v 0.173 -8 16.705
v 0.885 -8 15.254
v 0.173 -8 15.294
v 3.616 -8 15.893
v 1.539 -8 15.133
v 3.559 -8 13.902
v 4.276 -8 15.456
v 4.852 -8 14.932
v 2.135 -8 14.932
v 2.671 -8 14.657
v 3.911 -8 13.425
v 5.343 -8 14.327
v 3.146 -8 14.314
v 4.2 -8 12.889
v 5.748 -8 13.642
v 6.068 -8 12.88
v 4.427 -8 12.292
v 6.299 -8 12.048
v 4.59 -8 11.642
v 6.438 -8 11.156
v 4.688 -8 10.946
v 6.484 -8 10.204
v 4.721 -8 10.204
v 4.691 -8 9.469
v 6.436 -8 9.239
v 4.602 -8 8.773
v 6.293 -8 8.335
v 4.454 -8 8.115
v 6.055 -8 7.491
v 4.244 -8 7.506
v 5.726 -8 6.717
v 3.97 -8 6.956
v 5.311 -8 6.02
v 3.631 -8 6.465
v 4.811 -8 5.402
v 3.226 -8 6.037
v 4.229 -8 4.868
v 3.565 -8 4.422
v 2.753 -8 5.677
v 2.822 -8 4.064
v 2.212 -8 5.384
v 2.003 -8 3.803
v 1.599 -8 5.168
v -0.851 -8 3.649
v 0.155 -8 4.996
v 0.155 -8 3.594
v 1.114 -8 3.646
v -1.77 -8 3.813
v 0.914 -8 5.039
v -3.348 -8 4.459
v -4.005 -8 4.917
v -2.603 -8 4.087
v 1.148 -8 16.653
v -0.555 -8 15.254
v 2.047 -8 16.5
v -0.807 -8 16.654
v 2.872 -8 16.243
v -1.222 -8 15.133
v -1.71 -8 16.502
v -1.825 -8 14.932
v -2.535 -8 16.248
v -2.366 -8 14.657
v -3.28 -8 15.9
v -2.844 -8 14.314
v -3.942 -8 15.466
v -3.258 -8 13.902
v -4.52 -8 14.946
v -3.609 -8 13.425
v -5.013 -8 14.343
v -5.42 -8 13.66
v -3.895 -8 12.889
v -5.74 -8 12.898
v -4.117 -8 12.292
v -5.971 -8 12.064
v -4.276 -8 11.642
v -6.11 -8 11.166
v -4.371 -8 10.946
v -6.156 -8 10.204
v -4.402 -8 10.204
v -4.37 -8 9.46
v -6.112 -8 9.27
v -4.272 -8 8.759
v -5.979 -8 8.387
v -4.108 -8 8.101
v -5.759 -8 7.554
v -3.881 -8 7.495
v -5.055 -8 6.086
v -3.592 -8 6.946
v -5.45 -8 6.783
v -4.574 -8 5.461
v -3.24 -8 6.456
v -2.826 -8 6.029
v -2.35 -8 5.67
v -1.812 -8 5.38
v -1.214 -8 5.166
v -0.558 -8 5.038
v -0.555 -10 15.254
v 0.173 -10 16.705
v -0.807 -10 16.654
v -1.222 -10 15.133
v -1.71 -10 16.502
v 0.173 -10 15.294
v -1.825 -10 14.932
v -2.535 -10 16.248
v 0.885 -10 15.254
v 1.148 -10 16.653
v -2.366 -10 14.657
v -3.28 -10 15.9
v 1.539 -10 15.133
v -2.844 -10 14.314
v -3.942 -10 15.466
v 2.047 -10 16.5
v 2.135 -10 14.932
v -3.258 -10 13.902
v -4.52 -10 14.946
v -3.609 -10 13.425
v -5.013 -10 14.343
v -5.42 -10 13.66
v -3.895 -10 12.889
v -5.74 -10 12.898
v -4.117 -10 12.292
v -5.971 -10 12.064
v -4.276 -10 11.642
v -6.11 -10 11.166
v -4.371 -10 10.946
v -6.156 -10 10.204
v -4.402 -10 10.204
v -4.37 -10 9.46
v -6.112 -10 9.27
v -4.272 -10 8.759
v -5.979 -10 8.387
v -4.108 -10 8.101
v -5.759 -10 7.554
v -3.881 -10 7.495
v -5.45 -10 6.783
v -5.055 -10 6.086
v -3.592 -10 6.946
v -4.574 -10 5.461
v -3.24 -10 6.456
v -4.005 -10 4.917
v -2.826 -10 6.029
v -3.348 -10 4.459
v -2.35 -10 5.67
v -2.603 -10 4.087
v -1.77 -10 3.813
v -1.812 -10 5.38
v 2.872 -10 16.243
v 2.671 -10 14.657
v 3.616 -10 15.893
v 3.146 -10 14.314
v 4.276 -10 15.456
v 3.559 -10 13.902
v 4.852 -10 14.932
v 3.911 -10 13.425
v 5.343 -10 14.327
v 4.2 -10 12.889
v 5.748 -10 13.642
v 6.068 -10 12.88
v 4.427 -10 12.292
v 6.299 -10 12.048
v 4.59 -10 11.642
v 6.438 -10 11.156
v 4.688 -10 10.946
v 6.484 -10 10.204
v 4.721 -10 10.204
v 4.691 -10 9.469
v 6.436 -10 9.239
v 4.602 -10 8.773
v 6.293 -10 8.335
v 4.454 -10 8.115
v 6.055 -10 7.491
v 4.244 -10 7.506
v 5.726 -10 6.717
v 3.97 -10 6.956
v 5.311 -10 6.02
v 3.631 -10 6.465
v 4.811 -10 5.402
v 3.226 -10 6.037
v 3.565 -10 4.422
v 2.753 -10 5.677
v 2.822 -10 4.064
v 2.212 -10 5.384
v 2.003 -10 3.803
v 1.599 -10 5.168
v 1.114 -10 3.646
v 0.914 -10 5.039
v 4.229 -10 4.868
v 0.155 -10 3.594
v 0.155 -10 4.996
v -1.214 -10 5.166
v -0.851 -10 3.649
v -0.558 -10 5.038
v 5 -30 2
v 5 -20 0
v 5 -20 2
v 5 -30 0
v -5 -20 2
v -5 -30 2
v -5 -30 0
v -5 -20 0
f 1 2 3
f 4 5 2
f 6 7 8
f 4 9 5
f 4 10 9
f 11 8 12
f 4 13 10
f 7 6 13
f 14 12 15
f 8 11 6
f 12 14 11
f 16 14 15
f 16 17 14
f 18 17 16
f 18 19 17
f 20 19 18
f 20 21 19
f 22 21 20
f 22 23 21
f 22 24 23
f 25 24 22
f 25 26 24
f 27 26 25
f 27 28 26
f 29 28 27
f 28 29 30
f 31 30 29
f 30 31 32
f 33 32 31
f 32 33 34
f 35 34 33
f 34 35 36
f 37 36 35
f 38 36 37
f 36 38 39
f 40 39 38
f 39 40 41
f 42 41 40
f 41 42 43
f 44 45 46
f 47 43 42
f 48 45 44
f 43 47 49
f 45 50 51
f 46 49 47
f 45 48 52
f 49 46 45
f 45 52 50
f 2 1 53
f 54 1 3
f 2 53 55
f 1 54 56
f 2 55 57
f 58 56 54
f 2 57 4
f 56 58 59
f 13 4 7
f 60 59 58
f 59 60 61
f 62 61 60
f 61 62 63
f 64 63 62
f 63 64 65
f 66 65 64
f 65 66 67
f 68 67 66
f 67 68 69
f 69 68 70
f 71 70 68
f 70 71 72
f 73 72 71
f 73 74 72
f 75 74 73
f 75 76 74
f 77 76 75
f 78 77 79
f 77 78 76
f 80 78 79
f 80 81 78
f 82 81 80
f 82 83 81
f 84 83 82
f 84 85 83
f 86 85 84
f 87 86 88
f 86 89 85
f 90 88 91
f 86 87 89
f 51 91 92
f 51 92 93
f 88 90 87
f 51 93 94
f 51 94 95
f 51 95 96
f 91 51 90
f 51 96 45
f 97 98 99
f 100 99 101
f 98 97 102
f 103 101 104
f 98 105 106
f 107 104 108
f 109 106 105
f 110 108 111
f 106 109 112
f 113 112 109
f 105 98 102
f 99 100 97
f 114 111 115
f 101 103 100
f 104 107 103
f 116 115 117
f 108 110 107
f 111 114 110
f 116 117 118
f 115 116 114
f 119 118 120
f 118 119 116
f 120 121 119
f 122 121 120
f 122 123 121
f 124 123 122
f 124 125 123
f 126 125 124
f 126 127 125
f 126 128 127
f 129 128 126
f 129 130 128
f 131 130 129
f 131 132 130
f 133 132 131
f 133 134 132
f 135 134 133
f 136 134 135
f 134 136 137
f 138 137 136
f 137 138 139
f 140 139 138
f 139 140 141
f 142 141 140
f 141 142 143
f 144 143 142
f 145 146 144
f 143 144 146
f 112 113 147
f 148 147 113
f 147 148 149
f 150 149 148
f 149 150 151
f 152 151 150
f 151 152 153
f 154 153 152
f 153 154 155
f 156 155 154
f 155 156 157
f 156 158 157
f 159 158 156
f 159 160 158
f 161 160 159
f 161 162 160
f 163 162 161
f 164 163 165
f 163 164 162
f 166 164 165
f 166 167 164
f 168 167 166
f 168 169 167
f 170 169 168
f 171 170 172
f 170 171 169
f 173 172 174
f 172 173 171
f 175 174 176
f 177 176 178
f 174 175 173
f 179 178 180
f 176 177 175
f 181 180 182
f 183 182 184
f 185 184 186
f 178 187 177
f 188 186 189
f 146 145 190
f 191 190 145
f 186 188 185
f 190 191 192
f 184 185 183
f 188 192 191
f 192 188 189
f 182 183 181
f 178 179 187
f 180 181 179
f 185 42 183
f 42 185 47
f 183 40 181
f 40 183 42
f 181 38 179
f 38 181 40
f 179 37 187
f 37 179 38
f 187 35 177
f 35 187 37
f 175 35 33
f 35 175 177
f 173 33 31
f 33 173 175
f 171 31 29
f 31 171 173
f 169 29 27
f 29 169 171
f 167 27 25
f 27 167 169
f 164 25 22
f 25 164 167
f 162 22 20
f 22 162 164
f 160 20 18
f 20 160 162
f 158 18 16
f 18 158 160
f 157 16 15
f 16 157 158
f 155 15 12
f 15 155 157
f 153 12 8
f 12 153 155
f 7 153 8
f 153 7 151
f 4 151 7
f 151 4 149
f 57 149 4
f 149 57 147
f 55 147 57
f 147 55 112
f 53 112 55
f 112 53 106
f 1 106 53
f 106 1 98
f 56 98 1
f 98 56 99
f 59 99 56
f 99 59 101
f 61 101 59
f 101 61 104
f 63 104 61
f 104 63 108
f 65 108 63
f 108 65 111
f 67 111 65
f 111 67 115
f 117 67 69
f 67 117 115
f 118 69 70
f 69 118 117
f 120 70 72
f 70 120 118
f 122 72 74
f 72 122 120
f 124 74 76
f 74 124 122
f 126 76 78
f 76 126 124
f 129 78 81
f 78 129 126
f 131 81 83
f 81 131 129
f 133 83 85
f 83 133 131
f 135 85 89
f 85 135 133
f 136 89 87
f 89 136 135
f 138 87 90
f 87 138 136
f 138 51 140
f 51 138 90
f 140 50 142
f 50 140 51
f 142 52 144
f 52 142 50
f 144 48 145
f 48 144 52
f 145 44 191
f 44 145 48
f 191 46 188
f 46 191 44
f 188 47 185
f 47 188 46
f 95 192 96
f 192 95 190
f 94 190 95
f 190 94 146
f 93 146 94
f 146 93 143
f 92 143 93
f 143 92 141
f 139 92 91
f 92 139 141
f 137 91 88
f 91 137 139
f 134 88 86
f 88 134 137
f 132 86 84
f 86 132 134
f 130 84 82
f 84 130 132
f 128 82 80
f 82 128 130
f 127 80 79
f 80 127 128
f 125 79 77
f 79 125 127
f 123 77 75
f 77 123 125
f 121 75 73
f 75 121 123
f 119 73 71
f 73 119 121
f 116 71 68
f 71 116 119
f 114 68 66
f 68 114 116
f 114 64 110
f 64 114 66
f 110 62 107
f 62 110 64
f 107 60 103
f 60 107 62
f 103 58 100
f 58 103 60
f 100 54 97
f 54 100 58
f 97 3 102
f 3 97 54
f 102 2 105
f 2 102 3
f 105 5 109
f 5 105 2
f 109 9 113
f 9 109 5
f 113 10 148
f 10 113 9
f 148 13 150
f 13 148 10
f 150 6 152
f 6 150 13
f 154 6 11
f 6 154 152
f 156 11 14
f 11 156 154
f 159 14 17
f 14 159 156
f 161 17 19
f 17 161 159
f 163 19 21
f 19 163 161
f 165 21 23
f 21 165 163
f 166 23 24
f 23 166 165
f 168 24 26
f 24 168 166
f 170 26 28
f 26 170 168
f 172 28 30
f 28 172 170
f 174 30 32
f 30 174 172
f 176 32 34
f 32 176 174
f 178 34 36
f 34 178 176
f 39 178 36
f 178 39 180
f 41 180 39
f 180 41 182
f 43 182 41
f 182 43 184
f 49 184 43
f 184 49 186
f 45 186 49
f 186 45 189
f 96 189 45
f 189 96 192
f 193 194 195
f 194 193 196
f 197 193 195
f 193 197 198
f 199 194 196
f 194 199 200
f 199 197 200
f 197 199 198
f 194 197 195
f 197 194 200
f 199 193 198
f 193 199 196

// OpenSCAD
// CSG-modules.scad - Basic usage of modules, if, color, $fs/$fa

// Change this to false to remove the helper geometry
debug = true;

// Global resolution
$fs = 0.1;  // Don't generate smaller facets than 0.1 mm
$fa = 5;    // Don't generate larger angles than 5 degrees

TP_lower = 12.5/2;
TP_upper = 13.6/2;
TP_depth = 20;  // cube hieght
LowerWall = 3;
SideWall = 3;
ConnectionDepth = 10;

Letter = "O";
LetterSize = TP_depth *2/3;
LetterHeight = 2;
LetterFont = "Liberation Sans";

// Main geometry

//intersection()    // to make the wall part without rounded corners
//{
//    difference() {
//        translate([-TP_upper-SideWall,-TP_upper-SideWall,0]){
//            cubeX([TP_upper*2+SideWall*2, TP_upper*2+SideWall*2 + ConnectionDepth + 20, TP_depth], radius=2);
//        }
//        translate([0,0,LowerWall]){
//            cylinder(h = TP_depth-LowerWall, r1 = TP_lower, r2 = TP_upper, center = false);
//        }
//        cylinder(h = TP_depth, r = TP_lower*0.6, center = false);
        translate([0, -TP_depth/2 + LetterHeight, TP_depth/2]) rotate([90, 0, 0]) letter(Letter);
//    }
//    translate([-TP_upper-SideWall,-TP_upper-SideWall,0]){
//        cube([TP_upper*2+SideWall*2, TP_upper*2+SideWall*2 + ConnectionDepth, TP_depth]);
//    }
//}

translate([-5, -30 , 0]) cube([10,10,2]);

//
// Simple and fast corned cube!
// Anaximandro de Godinho.
//

module cubeX( size, radius=1, rounded=true, center=false )
{
	l = len( size );
	if( l == undef )
		_cubeX( size, size, size, radius, rounded, center );
	else
		_cubeX( size[0], size[1], size[2], radius, rounded, center );
}

module _cubeX( x, y, z, r, rounded, center )
{
	if( rounded )
		if( center )
			translate( [-x/2, -y/2, -z/2] )
			__cubeX( x, y, z, r );
		else
			__cubeX( x, y, z, r );
	else
		cube( [x, y, z], center );
}

module __cubeX(	x, y, z, r )
{
	//TODO: discount r.
	rC = r;
	hull()
	{
		translate( [rC, rC, rC] )
			sphere( r );
		translate( [rC, y-rC, rC] )
			sphere( r );
		translate( [rC, rC, z-rC] )
			sphere( r );
		translate( [rC, y-rC, z-rC] )
			sphere( r );

		translate( [x-rC, rC, rC] )
			sphere( r );
		translate( [x-rC, y-rC, rC] )
			sphere( r );
		translate( [x-rC, rC, z-rC] )
			sphere( r );
		translate( [x-rC, y-rC, z-rC] )
			sphere( r );
	}
}

module letter(l) {
  // Use linear_extrude() to make the letters 3D objects as they
  // are only 2D shapes when only using text()
  linear_extrude(height = LetterHeight) {
    text(l, size = LetterSize, font = LetterFont, halign = "center", valign = "center", $fn = 16);
  }
}
